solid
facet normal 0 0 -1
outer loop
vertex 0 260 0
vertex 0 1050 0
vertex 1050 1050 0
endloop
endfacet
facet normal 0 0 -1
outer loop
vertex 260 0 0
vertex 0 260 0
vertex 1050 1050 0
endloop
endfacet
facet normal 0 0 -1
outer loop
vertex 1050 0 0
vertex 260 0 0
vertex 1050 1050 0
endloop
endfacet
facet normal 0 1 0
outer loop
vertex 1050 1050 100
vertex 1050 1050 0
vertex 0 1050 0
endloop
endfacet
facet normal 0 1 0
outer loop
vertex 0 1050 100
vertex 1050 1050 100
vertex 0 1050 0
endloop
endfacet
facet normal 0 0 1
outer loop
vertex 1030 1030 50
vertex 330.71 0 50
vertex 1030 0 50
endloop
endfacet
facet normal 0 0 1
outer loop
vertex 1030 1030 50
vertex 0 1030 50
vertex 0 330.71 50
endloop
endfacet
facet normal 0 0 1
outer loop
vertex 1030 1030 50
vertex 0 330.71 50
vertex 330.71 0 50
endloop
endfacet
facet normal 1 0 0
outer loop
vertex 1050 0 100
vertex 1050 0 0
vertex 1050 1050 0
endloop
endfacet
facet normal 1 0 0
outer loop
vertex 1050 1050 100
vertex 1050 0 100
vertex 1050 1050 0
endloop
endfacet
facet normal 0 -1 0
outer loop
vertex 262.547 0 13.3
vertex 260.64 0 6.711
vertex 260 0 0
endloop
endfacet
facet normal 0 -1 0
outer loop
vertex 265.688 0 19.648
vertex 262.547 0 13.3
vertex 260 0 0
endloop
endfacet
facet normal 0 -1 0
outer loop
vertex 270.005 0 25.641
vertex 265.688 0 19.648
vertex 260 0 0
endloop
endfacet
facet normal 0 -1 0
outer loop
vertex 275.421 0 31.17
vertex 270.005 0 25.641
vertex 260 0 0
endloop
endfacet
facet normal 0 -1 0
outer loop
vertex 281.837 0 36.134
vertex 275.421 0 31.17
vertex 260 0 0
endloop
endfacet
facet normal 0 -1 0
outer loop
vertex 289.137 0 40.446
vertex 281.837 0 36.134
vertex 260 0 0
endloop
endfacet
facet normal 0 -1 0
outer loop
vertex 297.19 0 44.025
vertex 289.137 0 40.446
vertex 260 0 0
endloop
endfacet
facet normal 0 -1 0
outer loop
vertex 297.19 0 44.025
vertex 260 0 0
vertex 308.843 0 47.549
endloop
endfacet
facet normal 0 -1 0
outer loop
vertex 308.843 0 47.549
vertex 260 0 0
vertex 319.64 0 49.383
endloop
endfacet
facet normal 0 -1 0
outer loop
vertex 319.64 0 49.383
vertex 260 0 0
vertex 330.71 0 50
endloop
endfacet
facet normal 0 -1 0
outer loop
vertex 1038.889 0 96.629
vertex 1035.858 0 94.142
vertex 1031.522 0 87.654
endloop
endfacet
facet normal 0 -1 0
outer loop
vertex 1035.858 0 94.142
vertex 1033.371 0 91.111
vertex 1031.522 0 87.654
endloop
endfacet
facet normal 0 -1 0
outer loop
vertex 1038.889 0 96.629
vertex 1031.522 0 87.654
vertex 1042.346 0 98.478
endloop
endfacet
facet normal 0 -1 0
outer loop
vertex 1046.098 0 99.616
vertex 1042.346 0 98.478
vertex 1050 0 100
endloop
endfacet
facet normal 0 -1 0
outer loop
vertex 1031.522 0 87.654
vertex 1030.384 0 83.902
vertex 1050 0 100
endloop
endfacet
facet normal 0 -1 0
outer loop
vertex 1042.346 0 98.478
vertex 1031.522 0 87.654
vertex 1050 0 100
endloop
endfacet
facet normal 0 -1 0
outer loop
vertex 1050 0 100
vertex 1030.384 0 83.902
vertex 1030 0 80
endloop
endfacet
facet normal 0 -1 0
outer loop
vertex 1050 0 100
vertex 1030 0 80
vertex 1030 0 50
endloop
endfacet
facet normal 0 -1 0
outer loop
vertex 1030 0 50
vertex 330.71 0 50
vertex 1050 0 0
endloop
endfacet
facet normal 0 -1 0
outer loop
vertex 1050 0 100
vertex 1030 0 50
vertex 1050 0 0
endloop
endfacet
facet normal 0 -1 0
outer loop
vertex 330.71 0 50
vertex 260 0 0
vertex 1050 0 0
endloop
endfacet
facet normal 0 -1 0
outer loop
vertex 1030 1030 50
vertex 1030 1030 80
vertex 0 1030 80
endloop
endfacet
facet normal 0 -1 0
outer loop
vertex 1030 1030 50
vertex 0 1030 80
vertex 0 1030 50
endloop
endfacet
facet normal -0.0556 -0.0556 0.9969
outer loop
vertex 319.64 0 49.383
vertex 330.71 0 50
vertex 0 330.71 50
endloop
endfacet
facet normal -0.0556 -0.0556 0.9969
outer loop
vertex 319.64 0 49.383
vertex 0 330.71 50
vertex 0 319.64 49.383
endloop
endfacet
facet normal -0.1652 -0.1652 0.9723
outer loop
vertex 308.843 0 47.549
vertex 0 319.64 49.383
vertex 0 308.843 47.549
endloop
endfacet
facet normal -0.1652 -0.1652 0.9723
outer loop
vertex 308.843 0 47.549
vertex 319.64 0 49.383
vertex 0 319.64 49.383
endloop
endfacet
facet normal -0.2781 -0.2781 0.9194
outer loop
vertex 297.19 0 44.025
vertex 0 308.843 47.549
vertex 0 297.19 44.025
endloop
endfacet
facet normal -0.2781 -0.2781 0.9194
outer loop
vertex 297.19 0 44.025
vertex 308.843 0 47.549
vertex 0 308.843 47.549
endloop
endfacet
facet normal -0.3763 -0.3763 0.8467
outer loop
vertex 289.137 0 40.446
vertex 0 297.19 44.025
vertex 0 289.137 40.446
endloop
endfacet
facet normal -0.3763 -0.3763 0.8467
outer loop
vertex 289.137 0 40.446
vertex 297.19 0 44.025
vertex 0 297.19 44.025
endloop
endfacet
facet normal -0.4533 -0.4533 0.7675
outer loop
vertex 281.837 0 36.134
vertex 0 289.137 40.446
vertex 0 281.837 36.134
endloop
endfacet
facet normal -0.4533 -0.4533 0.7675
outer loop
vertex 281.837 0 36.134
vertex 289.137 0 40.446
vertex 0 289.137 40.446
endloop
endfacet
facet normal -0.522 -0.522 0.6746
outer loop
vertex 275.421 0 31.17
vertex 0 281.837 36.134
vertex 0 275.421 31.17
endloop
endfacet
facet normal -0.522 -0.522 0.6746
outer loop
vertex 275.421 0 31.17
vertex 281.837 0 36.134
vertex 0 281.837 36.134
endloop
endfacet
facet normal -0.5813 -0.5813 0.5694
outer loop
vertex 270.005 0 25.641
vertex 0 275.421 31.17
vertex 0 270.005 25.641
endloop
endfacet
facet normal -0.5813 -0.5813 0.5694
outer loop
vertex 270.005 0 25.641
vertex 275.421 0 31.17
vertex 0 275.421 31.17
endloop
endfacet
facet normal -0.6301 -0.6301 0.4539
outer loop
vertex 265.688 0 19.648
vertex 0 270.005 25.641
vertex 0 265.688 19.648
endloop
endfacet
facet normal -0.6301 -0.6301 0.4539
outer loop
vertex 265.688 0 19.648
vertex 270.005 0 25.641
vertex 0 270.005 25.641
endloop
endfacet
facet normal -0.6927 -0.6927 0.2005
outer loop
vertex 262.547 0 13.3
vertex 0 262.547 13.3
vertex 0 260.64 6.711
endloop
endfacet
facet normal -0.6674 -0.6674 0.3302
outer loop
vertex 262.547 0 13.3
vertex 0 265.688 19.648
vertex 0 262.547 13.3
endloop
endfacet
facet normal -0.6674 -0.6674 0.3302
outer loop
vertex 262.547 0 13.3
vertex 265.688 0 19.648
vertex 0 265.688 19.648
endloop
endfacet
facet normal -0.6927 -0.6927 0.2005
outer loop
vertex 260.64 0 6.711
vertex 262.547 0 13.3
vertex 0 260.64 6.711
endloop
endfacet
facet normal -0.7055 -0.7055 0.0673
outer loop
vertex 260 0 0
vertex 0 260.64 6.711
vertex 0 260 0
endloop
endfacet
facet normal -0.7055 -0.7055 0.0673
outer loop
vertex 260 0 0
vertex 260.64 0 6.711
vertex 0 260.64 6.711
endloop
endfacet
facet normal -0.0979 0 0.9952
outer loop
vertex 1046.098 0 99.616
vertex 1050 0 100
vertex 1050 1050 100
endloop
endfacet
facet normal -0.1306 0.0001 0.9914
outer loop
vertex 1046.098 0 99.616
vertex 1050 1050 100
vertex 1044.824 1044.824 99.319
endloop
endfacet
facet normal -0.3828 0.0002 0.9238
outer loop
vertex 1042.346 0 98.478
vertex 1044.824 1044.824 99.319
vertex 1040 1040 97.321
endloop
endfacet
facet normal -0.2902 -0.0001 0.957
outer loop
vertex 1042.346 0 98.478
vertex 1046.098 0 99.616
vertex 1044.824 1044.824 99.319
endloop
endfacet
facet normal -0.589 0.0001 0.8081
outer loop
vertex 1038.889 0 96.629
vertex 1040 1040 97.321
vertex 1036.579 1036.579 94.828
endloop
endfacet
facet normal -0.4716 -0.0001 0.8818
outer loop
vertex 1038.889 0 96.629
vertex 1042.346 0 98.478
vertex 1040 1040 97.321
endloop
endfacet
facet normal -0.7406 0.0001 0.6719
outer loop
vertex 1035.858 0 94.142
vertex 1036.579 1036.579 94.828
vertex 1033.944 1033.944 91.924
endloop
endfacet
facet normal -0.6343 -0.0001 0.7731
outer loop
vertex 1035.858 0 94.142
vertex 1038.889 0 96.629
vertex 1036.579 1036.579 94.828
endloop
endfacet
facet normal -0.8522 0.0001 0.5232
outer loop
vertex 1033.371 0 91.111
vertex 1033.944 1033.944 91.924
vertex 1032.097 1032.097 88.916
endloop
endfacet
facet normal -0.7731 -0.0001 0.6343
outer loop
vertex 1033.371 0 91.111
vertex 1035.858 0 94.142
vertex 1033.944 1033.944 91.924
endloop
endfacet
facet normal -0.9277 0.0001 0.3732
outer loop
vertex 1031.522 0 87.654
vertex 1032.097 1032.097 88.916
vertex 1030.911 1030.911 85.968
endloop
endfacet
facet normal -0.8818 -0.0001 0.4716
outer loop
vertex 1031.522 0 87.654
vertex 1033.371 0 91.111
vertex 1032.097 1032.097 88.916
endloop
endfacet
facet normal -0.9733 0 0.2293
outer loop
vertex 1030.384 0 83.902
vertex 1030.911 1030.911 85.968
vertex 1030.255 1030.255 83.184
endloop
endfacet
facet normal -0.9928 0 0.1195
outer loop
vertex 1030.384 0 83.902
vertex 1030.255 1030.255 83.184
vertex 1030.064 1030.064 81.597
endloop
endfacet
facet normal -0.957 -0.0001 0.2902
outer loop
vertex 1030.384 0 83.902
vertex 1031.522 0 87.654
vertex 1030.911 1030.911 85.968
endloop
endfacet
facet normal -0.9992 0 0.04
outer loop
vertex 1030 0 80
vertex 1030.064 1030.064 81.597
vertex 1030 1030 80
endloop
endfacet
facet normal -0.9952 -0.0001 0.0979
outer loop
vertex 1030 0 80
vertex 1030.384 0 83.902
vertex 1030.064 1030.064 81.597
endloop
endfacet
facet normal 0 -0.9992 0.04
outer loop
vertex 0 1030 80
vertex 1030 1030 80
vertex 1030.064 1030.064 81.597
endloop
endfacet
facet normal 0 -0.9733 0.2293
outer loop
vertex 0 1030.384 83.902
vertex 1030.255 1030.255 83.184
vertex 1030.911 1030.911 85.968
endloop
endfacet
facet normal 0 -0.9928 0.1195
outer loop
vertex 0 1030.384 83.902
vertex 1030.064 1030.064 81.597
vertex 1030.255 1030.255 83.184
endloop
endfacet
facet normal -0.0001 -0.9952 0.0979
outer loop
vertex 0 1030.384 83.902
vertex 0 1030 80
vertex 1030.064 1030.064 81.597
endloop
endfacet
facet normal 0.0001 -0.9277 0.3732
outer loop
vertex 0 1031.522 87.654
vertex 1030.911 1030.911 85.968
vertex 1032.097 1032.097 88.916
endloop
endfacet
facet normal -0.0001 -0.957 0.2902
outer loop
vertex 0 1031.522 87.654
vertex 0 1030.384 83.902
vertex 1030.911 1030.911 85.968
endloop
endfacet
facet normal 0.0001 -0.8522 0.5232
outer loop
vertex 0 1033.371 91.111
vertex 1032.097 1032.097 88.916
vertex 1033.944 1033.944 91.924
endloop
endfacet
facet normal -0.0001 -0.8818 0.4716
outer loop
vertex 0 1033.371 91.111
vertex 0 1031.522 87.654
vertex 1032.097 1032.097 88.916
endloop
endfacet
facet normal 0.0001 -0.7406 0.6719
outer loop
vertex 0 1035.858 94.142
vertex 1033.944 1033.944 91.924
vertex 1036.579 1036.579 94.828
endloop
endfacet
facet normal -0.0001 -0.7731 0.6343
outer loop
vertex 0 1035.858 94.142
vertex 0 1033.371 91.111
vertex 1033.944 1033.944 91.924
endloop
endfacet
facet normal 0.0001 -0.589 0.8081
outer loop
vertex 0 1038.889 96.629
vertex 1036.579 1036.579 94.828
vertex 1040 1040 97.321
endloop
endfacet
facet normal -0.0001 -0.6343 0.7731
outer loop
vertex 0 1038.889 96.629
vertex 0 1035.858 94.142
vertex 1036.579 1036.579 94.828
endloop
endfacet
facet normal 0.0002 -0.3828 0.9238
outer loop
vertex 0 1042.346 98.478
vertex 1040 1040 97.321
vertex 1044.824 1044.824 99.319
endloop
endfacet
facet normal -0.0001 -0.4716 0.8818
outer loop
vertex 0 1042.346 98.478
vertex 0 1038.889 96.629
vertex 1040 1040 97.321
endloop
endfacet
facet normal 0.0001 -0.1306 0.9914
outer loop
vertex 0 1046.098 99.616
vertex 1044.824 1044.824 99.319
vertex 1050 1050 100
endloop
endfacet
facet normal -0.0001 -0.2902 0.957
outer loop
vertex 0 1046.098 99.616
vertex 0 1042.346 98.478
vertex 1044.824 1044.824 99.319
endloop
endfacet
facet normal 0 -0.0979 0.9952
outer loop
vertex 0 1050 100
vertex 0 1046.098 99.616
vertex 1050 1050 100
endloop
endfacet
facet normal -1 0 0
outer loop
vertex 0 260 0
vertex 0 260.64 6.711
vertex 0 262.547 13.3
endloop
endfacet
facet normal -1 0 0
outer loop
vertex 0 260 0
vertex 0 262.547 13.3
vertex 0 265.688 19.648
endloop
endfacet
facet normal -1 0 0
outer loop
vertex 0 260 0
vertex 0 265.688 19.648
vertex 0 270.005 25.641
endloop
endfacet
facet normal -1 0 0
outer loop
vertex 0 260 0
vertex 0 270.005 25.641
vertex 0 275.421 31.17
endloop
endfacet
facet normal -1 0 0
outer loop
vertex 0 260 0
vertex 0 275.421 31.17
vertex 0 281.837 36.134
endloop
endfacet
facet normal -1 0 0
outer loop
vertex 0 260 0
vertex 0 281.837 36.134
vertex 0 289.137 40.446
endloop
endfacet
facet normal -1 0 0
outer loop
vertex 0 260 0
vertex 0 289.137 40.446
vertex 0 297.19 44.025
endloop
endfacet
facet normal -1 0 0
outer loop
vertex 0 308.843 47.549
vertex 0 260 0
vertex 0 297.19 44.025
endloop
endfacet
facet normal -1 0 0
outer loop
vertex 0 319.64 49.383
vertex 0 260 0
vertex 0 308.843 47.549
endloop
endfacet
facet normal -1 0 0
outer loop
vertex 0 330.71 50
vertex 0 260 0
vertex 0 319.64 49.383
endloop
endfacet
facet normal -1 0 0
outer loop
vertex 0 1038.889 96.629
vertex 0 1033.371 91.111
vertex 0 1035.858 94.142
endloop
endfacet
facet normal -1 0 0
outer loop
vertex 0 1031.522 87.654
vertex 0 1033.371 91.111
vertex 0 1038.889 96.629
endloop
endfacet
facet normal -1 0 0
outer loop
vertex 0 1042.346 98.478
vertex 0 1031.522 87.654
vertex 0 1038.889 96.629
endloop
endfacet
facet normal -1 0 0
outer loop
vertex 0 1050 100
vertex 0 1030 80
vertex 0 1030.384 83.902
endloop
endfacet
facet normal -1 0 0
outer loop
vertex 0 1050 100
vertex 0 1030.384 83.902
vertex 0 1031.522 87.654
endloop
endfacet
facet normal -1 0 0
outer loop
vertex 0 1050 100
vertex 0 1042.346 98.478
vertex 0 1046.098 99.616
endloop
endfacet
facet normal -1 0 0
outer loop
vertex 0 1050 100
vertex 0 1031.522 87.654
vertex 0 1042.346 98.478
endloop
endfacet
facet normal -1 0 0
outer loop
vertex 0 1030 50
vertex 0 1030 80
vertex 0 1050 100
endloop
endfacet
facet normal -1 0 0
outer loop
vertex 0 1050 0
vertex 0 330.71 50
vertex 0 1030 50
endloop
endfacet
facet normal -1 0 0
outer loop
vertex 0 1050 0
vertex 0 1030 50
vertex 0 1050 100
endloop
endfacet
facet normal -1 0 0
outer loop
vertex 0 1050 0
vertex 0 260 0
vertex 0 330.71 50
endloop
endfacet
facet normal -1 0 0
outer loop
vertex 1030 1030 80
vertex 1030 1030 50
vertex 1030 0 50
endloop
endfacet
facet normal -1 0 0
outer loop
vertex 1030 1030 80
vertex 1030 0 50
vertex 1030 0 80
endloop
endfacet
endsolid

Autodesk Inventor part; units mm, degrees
ref_plane "YZ Plane" through (0, 0, 0) normal (1, 0, 0) x (0, 1, 0)
ref_plane "XZ Plane" through (0, 0, 0) normal (0, 1, 0) x (-1, 0, 0)
ref_plane "XY Plane" through (0, 0, 0) normal (0, 0, 1) x (1, 0, 0)
sketch "Sketch1" plane through (0, 0, 0) normal (0, 0, 1) x (1, 0, 0)
  line L0 (0, 0) -> (1050, 0) construction
  line L1 (1050, 0) -> (1050, 1050)
  line L2 (1050, 1050) -> (0, 1050)
  line L3 (0, 1050) -> (0, 0) construction
  line L4 (0, 260) -> (260, 0)
  line L5 (0, 260) -> (0, 1050)
  line L6 (260, 0) -> (1050, 0)
  dimension "profundidad" = 790
  dimension "d22" = 790
  dimension "d23" = 1050
extrude "Extrusion1" add sketch "Sketch1" along normal blind 50
fillet "Fillet1" radius 50 1 edges at (130, 130, 50)
sketch "Sketch3" plane through (1050, 0, 0) normal (0, -1, 0) x (1, 0, 0)
  line L0 (-1050, 0) -> (0, 0) projected
  line L1 (0, 0) -> (-20, 0)
  line L2 (-20, 0) -> (-20, 80)
  line L3 (0, 100) -> (0, 100)
  line L4 (0, 100) -> (0, 0)
  arc A0 (0, 100) -> (-20, 80) centre (0, 80) ccw
  point P0 (-20, 100)
  dimension "d9" = 20
  dimension "d10" = 100
  dimension "d11" = 20
extrude "Extrusion2" add sketch "Sketch3" against normal up to surface (1050 mm away)
sketch "Sketch4" plane through (0, 1050, 0) normal (-1, 0, 0) x (0, 0, 1)
  line L0 (0, 0) -> (100, 0) projected
  line L1 (100, -1050) -> (100, 0) projected
  line L2 (0, 0) -> (100, 0)
  line L3 (100, 0) -> (100, 0)
  line L4 (80, -20) -> (0, -20)
  line L5 (0, -20) -> (0, 0)
  arc A0 (80, -20) -> (100, 0) centre (80, 0) ccw
  point P0 (0, -1050)
  point P1 (100, -20)
  dimension "d14" = 20
  dimension "d15" = 20
extrude "Extrusion3" add sketch "Sketch4" against normal up to surface (1050 mm away)
properties part number "meson_esquinero"
